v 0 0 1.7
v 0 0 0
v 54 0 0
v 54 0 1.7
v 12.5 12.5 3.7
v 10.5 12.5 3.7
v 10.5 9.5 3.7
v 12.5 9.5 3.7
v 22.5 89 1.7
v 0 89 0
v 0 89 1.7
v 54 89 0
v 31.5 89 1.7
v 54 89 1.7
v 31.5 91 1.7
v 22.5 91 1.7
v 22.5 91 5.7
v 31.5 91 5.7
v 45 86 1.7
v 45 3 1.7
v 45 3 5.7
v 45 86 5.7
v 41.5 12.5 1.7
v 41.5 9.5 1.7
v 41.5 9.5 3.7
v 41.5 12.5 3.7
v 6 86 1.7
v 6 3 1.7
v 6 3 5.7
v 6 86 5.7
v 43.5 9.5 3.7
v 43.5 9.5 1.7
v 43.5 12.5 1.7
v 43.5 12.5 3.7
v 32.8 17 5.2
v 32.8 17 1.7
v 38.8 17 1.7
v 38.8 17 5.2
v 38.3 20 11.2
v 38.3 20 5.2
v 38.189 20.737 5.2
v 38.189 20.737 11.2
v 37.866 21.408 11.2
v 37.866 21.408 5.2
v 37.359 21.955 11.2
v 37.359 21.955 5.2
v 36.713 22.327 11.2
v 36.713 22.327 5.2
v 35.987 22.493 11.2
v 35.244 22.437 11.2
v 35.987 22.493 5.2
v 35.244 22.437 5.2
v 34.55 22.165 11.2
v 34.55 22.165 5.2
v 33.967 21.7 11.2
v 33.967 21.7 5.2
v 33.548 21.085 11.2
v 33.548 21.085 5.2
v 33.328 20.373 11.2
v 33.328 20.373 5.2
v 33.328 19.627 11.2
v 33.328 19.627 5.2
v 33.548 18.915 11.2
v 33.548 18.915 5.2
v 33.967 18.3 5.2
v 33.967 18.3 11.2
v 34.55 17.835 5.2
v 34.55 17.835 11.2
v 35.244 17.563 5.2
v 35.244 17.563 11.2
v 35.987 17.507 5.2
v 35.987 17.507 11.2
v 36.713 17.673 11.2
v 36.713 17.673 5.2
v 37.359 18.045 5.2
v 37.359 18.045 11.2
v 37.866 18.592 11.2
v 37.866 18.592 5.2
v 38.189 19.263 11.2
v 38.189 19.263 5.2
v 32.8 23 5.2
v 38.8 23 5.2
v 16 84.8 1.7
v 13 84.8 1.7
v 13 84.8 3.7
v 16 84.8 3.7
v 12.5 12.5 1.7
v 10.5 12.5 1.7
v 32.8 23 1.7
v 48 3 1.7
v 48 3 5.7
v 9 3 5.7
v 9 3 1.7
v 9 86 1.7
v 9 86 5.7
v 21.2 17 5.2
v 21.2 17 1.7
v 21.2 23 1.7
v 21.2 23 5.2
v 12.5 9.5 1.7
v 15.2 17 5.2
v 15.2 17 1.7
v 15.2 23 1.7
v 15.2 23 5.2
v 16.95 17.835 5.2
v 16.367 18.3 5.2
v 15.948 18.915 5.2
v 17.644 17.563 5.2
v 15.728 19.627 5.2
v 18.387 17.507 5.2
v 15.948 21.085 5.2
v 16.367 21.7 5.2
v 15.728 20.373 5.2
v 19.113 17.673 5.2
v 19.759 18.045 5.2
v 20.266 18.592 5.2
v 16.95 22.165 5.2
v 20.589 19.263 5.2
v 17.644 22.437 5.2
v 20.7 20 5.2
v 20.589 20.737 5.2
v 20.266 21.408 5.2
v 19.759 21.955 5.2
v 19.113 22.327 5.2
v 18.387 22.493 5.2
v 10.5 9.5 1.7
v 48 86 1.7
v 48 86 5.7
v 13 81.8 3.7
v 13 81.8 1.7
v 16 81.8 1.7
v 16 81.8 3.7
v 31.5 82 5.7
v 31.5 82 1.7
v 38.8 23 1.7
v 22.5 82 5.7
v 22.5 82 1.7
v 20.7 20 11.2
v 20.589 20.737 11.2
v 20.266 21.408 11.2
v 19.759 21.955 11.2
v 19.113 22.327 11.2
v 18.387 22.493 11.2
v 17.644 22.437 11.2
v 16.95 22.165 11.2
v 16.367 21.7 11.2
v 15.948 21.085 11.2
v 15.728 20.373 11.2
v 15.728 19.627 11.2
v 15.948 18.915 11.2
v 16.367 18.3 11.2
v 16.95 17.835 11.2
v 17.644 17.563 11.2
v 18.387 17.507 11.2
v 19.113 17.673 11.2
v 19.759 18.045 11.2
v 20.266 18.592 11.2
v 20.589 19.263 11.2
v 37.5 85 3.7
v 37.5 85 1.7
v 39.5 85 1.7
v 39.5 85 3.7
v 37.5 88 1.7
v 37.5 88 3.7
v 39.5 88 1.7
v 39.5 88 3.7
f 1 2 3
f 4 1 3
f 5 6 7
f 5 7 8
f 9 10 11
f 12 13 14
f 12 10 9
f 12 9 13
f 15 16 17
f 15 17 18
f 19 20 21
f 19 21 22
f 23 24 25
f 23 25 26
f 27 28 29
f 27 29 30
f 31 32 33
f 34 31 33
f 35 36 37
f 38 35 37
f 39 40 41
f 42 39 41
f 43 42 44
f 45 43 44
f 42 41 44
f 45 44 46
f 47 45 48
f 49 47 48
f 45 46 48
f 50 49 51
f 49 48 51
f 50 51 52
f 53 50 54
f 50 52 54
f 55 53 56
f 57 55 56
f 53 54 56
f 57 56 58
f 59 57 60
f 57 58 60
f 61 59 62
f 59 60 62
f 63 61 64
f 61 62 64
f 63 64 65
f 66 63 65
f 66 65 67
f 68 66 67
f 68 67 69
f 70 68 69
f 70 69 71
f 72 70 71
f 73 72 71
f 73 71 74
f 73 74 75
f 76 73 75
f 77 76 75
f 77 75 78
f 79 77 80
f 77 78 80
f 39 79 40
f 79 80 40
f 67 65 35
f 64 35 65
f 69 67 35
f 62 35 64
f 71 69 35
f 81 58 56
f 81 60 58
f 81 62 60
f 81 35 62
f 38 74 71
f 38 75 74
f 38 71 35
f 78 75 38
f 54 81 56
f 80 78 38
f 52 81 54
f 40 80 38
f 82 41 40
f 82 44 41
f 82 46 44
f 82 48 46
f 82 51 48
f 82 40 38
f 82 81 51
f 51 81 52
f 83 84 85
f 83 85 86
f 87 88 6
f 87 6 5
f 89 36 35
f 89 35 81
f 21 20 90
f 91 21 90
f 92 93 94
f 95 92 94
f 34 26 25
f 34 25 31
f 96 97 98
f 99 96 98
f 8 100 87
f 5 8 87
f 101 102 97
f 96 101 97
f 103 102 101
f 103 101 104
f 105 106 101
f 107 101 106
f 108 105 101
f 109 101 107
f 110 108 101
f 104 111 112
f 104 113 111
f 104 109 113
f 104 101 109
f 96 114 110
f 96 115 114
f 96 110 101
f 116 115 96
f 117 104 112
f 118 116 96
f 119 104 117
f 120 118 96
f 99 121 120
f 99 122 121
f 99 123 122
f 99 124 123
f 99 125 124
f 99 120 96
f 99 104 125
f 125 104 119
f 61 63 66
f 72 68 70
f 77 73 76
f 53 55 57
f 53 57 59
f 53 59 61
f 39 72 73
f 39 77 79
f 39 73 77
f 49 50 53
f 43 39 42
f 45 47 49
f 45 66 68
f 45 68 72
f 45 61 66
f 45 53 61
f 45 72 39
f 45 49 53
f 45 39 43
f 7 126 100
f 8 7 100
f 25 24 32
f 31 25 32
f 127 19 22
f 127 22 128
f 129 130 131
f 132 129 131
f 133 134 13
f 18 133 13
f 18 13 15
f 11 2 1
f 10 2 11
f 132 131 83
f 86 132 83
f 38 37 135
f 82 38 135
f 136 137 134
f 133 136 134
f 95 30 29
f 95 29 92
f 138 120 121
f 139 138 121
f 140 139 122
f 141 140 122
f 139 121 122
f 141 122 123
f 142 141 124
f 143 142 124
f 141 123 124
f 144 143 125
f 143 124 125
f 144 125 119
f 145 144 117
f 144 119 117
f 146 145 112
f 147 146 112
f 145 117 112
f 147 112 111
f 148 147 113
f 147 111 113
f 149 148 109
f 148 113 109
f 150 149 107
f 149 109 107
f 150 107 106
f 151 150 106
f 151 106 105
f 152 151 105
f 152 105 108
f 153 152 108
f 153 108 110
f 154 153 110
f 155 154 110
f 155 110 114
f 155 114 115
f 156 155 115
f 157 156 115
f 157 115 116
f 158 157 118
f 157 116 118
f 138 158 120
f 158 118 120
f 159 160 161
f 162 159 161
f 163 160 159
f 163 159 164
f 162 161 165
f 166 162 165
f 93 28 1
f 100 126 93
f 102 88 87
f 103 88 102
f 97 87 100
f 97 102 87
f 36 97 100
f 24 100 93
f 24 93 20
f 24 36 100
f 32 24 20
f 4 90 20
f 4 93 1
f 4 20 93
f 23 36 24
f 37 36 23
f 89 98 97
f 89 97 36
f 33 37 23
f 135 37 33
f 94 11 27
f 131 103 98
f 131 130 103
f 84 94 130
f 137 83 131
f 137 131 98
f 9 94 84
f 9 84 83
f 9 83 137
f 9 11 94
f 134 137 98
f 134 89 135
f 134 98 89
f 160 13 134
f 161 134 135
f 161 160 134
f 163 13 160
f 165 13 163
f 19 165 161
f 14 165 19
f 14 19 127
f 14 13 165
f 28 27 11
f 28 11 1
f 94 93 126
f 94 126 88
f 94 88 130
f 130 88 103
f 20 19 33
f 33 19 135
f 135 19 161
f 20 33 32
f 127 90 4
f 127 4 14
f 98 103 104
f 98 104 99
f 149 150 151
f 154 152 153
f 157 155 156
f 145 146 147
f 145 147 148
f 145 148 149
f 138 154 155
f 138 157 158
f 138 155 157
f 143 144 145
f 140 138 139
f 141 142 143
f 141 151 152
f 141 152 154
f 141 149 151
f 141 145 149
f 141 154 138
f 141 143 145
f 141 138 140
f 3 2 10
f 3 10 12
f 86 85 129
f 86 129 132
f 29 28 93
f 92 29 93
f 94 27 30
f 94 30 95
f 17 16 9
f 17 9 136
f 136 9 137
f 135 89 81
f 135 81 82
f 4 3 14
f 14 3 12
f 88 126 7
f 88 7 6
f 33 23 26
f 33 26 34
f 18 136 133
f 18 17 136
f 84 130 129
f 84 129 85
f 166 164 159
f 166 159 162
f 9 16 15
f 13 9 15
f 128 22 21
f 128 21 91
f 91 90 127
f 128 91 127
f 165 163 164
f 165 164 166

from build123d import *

# Parameters (mm, degrees)
F0_W      = 54
F0_H      = 89
F1_DEPTH  = 1.7
F2_W      = 3
F2_H      = 83
F3_DEPTH  = 4
F4_W      = 6
F4_H      = 6
F5_DEPTH  = 3.5
F7_R      = 2.5
F6_R      = 2.5
F8_DEPTH  = 6
F9_W      = 2
F9_H      = 3
F10_DEPTH = 2
F11_W     = 9
F11_H     = 7
F11_H_2   = 2
F12_DEPTH = 4
F13_W     = 3
F13_H     = 3
F13_W_2   = 2
F14_DEPTH = 2


with BuildPart() as f1:
    # F0 (on Top) → F1 (new body)
    with BuildSketch(Plane.XY):
        with Locations((27, 44.5)):
            Rectangle(F0_W, F0_H)
    extrude(amount=F1_DEPTH)

    # F2 (on face) → F3 (join)
    with BuildSketch(Plane.XY.offset(1.7)):
        with Locations((7.5, 44.5)):
            Rectangle(F2_W, F2_H)
        with Locations((46.5, 44.5)):
            Rectangle(F2_W, F2_H)
    extrude(amount=F3_DEPTH)

    # F4 (on face) → F5 (join)
    with BuildSketch(Plane.XY.offset(1.7)):
        with Locations((18.2, 20)):
            Rectangle(F4_W, F4_H)
        with Locations((35.8, 20)):
            Rectangle(F4_W, F4_H)
    extrude(amount=F5_DEPTH)

    # F7 (on face) + F6 (on face) → F8 (join)
    with BuildSketch(Plane.XY.offset(5.2)):
        with Locations((35.8, 20)):
            Circle(F7_R)
    with BuildSketch(Plane.XY.offset(5.2)):
        with Locations((18.2, 20)):
            Circle(F6_R)
    extrude(amount=F8_DEPTH)

    # F9 (on face) → F10 (join)
    with BuildSketch(Plane.XY.offset(1.7)):
        with Locations((42.5, 11)):
            Rectangle(F9_W, F9_H)
        with Locations((11.5, 11)):
            Rectangle(F9_W, F9_H)
    extrude(amount=F10_DEPTH)

    # F11 (on face) → F12 (join)
    with BuildSketch(Plane.XY.offset(1.7)):
        with Locations((27, 85.5)):
            Rectangle(F11_W, F11_H)
        with Locations((27, 90)):
            Rectangle(F11_W, F11_H_2)
    extrude(amount=F12_DEPTH)

    # F13 (on face) → F14 (join)
    with BuildSketch(Plane.XY.offset(1.7)):
        with Locations((14.5, 83.3)):
            Rectangle(F13_W, F13_H)
        with Locations((38.5, 86.5)):
            Rectangle(F13_W_2, F13_H)
    extrude(amount=F14_DEPTH)


solid = f1.part
